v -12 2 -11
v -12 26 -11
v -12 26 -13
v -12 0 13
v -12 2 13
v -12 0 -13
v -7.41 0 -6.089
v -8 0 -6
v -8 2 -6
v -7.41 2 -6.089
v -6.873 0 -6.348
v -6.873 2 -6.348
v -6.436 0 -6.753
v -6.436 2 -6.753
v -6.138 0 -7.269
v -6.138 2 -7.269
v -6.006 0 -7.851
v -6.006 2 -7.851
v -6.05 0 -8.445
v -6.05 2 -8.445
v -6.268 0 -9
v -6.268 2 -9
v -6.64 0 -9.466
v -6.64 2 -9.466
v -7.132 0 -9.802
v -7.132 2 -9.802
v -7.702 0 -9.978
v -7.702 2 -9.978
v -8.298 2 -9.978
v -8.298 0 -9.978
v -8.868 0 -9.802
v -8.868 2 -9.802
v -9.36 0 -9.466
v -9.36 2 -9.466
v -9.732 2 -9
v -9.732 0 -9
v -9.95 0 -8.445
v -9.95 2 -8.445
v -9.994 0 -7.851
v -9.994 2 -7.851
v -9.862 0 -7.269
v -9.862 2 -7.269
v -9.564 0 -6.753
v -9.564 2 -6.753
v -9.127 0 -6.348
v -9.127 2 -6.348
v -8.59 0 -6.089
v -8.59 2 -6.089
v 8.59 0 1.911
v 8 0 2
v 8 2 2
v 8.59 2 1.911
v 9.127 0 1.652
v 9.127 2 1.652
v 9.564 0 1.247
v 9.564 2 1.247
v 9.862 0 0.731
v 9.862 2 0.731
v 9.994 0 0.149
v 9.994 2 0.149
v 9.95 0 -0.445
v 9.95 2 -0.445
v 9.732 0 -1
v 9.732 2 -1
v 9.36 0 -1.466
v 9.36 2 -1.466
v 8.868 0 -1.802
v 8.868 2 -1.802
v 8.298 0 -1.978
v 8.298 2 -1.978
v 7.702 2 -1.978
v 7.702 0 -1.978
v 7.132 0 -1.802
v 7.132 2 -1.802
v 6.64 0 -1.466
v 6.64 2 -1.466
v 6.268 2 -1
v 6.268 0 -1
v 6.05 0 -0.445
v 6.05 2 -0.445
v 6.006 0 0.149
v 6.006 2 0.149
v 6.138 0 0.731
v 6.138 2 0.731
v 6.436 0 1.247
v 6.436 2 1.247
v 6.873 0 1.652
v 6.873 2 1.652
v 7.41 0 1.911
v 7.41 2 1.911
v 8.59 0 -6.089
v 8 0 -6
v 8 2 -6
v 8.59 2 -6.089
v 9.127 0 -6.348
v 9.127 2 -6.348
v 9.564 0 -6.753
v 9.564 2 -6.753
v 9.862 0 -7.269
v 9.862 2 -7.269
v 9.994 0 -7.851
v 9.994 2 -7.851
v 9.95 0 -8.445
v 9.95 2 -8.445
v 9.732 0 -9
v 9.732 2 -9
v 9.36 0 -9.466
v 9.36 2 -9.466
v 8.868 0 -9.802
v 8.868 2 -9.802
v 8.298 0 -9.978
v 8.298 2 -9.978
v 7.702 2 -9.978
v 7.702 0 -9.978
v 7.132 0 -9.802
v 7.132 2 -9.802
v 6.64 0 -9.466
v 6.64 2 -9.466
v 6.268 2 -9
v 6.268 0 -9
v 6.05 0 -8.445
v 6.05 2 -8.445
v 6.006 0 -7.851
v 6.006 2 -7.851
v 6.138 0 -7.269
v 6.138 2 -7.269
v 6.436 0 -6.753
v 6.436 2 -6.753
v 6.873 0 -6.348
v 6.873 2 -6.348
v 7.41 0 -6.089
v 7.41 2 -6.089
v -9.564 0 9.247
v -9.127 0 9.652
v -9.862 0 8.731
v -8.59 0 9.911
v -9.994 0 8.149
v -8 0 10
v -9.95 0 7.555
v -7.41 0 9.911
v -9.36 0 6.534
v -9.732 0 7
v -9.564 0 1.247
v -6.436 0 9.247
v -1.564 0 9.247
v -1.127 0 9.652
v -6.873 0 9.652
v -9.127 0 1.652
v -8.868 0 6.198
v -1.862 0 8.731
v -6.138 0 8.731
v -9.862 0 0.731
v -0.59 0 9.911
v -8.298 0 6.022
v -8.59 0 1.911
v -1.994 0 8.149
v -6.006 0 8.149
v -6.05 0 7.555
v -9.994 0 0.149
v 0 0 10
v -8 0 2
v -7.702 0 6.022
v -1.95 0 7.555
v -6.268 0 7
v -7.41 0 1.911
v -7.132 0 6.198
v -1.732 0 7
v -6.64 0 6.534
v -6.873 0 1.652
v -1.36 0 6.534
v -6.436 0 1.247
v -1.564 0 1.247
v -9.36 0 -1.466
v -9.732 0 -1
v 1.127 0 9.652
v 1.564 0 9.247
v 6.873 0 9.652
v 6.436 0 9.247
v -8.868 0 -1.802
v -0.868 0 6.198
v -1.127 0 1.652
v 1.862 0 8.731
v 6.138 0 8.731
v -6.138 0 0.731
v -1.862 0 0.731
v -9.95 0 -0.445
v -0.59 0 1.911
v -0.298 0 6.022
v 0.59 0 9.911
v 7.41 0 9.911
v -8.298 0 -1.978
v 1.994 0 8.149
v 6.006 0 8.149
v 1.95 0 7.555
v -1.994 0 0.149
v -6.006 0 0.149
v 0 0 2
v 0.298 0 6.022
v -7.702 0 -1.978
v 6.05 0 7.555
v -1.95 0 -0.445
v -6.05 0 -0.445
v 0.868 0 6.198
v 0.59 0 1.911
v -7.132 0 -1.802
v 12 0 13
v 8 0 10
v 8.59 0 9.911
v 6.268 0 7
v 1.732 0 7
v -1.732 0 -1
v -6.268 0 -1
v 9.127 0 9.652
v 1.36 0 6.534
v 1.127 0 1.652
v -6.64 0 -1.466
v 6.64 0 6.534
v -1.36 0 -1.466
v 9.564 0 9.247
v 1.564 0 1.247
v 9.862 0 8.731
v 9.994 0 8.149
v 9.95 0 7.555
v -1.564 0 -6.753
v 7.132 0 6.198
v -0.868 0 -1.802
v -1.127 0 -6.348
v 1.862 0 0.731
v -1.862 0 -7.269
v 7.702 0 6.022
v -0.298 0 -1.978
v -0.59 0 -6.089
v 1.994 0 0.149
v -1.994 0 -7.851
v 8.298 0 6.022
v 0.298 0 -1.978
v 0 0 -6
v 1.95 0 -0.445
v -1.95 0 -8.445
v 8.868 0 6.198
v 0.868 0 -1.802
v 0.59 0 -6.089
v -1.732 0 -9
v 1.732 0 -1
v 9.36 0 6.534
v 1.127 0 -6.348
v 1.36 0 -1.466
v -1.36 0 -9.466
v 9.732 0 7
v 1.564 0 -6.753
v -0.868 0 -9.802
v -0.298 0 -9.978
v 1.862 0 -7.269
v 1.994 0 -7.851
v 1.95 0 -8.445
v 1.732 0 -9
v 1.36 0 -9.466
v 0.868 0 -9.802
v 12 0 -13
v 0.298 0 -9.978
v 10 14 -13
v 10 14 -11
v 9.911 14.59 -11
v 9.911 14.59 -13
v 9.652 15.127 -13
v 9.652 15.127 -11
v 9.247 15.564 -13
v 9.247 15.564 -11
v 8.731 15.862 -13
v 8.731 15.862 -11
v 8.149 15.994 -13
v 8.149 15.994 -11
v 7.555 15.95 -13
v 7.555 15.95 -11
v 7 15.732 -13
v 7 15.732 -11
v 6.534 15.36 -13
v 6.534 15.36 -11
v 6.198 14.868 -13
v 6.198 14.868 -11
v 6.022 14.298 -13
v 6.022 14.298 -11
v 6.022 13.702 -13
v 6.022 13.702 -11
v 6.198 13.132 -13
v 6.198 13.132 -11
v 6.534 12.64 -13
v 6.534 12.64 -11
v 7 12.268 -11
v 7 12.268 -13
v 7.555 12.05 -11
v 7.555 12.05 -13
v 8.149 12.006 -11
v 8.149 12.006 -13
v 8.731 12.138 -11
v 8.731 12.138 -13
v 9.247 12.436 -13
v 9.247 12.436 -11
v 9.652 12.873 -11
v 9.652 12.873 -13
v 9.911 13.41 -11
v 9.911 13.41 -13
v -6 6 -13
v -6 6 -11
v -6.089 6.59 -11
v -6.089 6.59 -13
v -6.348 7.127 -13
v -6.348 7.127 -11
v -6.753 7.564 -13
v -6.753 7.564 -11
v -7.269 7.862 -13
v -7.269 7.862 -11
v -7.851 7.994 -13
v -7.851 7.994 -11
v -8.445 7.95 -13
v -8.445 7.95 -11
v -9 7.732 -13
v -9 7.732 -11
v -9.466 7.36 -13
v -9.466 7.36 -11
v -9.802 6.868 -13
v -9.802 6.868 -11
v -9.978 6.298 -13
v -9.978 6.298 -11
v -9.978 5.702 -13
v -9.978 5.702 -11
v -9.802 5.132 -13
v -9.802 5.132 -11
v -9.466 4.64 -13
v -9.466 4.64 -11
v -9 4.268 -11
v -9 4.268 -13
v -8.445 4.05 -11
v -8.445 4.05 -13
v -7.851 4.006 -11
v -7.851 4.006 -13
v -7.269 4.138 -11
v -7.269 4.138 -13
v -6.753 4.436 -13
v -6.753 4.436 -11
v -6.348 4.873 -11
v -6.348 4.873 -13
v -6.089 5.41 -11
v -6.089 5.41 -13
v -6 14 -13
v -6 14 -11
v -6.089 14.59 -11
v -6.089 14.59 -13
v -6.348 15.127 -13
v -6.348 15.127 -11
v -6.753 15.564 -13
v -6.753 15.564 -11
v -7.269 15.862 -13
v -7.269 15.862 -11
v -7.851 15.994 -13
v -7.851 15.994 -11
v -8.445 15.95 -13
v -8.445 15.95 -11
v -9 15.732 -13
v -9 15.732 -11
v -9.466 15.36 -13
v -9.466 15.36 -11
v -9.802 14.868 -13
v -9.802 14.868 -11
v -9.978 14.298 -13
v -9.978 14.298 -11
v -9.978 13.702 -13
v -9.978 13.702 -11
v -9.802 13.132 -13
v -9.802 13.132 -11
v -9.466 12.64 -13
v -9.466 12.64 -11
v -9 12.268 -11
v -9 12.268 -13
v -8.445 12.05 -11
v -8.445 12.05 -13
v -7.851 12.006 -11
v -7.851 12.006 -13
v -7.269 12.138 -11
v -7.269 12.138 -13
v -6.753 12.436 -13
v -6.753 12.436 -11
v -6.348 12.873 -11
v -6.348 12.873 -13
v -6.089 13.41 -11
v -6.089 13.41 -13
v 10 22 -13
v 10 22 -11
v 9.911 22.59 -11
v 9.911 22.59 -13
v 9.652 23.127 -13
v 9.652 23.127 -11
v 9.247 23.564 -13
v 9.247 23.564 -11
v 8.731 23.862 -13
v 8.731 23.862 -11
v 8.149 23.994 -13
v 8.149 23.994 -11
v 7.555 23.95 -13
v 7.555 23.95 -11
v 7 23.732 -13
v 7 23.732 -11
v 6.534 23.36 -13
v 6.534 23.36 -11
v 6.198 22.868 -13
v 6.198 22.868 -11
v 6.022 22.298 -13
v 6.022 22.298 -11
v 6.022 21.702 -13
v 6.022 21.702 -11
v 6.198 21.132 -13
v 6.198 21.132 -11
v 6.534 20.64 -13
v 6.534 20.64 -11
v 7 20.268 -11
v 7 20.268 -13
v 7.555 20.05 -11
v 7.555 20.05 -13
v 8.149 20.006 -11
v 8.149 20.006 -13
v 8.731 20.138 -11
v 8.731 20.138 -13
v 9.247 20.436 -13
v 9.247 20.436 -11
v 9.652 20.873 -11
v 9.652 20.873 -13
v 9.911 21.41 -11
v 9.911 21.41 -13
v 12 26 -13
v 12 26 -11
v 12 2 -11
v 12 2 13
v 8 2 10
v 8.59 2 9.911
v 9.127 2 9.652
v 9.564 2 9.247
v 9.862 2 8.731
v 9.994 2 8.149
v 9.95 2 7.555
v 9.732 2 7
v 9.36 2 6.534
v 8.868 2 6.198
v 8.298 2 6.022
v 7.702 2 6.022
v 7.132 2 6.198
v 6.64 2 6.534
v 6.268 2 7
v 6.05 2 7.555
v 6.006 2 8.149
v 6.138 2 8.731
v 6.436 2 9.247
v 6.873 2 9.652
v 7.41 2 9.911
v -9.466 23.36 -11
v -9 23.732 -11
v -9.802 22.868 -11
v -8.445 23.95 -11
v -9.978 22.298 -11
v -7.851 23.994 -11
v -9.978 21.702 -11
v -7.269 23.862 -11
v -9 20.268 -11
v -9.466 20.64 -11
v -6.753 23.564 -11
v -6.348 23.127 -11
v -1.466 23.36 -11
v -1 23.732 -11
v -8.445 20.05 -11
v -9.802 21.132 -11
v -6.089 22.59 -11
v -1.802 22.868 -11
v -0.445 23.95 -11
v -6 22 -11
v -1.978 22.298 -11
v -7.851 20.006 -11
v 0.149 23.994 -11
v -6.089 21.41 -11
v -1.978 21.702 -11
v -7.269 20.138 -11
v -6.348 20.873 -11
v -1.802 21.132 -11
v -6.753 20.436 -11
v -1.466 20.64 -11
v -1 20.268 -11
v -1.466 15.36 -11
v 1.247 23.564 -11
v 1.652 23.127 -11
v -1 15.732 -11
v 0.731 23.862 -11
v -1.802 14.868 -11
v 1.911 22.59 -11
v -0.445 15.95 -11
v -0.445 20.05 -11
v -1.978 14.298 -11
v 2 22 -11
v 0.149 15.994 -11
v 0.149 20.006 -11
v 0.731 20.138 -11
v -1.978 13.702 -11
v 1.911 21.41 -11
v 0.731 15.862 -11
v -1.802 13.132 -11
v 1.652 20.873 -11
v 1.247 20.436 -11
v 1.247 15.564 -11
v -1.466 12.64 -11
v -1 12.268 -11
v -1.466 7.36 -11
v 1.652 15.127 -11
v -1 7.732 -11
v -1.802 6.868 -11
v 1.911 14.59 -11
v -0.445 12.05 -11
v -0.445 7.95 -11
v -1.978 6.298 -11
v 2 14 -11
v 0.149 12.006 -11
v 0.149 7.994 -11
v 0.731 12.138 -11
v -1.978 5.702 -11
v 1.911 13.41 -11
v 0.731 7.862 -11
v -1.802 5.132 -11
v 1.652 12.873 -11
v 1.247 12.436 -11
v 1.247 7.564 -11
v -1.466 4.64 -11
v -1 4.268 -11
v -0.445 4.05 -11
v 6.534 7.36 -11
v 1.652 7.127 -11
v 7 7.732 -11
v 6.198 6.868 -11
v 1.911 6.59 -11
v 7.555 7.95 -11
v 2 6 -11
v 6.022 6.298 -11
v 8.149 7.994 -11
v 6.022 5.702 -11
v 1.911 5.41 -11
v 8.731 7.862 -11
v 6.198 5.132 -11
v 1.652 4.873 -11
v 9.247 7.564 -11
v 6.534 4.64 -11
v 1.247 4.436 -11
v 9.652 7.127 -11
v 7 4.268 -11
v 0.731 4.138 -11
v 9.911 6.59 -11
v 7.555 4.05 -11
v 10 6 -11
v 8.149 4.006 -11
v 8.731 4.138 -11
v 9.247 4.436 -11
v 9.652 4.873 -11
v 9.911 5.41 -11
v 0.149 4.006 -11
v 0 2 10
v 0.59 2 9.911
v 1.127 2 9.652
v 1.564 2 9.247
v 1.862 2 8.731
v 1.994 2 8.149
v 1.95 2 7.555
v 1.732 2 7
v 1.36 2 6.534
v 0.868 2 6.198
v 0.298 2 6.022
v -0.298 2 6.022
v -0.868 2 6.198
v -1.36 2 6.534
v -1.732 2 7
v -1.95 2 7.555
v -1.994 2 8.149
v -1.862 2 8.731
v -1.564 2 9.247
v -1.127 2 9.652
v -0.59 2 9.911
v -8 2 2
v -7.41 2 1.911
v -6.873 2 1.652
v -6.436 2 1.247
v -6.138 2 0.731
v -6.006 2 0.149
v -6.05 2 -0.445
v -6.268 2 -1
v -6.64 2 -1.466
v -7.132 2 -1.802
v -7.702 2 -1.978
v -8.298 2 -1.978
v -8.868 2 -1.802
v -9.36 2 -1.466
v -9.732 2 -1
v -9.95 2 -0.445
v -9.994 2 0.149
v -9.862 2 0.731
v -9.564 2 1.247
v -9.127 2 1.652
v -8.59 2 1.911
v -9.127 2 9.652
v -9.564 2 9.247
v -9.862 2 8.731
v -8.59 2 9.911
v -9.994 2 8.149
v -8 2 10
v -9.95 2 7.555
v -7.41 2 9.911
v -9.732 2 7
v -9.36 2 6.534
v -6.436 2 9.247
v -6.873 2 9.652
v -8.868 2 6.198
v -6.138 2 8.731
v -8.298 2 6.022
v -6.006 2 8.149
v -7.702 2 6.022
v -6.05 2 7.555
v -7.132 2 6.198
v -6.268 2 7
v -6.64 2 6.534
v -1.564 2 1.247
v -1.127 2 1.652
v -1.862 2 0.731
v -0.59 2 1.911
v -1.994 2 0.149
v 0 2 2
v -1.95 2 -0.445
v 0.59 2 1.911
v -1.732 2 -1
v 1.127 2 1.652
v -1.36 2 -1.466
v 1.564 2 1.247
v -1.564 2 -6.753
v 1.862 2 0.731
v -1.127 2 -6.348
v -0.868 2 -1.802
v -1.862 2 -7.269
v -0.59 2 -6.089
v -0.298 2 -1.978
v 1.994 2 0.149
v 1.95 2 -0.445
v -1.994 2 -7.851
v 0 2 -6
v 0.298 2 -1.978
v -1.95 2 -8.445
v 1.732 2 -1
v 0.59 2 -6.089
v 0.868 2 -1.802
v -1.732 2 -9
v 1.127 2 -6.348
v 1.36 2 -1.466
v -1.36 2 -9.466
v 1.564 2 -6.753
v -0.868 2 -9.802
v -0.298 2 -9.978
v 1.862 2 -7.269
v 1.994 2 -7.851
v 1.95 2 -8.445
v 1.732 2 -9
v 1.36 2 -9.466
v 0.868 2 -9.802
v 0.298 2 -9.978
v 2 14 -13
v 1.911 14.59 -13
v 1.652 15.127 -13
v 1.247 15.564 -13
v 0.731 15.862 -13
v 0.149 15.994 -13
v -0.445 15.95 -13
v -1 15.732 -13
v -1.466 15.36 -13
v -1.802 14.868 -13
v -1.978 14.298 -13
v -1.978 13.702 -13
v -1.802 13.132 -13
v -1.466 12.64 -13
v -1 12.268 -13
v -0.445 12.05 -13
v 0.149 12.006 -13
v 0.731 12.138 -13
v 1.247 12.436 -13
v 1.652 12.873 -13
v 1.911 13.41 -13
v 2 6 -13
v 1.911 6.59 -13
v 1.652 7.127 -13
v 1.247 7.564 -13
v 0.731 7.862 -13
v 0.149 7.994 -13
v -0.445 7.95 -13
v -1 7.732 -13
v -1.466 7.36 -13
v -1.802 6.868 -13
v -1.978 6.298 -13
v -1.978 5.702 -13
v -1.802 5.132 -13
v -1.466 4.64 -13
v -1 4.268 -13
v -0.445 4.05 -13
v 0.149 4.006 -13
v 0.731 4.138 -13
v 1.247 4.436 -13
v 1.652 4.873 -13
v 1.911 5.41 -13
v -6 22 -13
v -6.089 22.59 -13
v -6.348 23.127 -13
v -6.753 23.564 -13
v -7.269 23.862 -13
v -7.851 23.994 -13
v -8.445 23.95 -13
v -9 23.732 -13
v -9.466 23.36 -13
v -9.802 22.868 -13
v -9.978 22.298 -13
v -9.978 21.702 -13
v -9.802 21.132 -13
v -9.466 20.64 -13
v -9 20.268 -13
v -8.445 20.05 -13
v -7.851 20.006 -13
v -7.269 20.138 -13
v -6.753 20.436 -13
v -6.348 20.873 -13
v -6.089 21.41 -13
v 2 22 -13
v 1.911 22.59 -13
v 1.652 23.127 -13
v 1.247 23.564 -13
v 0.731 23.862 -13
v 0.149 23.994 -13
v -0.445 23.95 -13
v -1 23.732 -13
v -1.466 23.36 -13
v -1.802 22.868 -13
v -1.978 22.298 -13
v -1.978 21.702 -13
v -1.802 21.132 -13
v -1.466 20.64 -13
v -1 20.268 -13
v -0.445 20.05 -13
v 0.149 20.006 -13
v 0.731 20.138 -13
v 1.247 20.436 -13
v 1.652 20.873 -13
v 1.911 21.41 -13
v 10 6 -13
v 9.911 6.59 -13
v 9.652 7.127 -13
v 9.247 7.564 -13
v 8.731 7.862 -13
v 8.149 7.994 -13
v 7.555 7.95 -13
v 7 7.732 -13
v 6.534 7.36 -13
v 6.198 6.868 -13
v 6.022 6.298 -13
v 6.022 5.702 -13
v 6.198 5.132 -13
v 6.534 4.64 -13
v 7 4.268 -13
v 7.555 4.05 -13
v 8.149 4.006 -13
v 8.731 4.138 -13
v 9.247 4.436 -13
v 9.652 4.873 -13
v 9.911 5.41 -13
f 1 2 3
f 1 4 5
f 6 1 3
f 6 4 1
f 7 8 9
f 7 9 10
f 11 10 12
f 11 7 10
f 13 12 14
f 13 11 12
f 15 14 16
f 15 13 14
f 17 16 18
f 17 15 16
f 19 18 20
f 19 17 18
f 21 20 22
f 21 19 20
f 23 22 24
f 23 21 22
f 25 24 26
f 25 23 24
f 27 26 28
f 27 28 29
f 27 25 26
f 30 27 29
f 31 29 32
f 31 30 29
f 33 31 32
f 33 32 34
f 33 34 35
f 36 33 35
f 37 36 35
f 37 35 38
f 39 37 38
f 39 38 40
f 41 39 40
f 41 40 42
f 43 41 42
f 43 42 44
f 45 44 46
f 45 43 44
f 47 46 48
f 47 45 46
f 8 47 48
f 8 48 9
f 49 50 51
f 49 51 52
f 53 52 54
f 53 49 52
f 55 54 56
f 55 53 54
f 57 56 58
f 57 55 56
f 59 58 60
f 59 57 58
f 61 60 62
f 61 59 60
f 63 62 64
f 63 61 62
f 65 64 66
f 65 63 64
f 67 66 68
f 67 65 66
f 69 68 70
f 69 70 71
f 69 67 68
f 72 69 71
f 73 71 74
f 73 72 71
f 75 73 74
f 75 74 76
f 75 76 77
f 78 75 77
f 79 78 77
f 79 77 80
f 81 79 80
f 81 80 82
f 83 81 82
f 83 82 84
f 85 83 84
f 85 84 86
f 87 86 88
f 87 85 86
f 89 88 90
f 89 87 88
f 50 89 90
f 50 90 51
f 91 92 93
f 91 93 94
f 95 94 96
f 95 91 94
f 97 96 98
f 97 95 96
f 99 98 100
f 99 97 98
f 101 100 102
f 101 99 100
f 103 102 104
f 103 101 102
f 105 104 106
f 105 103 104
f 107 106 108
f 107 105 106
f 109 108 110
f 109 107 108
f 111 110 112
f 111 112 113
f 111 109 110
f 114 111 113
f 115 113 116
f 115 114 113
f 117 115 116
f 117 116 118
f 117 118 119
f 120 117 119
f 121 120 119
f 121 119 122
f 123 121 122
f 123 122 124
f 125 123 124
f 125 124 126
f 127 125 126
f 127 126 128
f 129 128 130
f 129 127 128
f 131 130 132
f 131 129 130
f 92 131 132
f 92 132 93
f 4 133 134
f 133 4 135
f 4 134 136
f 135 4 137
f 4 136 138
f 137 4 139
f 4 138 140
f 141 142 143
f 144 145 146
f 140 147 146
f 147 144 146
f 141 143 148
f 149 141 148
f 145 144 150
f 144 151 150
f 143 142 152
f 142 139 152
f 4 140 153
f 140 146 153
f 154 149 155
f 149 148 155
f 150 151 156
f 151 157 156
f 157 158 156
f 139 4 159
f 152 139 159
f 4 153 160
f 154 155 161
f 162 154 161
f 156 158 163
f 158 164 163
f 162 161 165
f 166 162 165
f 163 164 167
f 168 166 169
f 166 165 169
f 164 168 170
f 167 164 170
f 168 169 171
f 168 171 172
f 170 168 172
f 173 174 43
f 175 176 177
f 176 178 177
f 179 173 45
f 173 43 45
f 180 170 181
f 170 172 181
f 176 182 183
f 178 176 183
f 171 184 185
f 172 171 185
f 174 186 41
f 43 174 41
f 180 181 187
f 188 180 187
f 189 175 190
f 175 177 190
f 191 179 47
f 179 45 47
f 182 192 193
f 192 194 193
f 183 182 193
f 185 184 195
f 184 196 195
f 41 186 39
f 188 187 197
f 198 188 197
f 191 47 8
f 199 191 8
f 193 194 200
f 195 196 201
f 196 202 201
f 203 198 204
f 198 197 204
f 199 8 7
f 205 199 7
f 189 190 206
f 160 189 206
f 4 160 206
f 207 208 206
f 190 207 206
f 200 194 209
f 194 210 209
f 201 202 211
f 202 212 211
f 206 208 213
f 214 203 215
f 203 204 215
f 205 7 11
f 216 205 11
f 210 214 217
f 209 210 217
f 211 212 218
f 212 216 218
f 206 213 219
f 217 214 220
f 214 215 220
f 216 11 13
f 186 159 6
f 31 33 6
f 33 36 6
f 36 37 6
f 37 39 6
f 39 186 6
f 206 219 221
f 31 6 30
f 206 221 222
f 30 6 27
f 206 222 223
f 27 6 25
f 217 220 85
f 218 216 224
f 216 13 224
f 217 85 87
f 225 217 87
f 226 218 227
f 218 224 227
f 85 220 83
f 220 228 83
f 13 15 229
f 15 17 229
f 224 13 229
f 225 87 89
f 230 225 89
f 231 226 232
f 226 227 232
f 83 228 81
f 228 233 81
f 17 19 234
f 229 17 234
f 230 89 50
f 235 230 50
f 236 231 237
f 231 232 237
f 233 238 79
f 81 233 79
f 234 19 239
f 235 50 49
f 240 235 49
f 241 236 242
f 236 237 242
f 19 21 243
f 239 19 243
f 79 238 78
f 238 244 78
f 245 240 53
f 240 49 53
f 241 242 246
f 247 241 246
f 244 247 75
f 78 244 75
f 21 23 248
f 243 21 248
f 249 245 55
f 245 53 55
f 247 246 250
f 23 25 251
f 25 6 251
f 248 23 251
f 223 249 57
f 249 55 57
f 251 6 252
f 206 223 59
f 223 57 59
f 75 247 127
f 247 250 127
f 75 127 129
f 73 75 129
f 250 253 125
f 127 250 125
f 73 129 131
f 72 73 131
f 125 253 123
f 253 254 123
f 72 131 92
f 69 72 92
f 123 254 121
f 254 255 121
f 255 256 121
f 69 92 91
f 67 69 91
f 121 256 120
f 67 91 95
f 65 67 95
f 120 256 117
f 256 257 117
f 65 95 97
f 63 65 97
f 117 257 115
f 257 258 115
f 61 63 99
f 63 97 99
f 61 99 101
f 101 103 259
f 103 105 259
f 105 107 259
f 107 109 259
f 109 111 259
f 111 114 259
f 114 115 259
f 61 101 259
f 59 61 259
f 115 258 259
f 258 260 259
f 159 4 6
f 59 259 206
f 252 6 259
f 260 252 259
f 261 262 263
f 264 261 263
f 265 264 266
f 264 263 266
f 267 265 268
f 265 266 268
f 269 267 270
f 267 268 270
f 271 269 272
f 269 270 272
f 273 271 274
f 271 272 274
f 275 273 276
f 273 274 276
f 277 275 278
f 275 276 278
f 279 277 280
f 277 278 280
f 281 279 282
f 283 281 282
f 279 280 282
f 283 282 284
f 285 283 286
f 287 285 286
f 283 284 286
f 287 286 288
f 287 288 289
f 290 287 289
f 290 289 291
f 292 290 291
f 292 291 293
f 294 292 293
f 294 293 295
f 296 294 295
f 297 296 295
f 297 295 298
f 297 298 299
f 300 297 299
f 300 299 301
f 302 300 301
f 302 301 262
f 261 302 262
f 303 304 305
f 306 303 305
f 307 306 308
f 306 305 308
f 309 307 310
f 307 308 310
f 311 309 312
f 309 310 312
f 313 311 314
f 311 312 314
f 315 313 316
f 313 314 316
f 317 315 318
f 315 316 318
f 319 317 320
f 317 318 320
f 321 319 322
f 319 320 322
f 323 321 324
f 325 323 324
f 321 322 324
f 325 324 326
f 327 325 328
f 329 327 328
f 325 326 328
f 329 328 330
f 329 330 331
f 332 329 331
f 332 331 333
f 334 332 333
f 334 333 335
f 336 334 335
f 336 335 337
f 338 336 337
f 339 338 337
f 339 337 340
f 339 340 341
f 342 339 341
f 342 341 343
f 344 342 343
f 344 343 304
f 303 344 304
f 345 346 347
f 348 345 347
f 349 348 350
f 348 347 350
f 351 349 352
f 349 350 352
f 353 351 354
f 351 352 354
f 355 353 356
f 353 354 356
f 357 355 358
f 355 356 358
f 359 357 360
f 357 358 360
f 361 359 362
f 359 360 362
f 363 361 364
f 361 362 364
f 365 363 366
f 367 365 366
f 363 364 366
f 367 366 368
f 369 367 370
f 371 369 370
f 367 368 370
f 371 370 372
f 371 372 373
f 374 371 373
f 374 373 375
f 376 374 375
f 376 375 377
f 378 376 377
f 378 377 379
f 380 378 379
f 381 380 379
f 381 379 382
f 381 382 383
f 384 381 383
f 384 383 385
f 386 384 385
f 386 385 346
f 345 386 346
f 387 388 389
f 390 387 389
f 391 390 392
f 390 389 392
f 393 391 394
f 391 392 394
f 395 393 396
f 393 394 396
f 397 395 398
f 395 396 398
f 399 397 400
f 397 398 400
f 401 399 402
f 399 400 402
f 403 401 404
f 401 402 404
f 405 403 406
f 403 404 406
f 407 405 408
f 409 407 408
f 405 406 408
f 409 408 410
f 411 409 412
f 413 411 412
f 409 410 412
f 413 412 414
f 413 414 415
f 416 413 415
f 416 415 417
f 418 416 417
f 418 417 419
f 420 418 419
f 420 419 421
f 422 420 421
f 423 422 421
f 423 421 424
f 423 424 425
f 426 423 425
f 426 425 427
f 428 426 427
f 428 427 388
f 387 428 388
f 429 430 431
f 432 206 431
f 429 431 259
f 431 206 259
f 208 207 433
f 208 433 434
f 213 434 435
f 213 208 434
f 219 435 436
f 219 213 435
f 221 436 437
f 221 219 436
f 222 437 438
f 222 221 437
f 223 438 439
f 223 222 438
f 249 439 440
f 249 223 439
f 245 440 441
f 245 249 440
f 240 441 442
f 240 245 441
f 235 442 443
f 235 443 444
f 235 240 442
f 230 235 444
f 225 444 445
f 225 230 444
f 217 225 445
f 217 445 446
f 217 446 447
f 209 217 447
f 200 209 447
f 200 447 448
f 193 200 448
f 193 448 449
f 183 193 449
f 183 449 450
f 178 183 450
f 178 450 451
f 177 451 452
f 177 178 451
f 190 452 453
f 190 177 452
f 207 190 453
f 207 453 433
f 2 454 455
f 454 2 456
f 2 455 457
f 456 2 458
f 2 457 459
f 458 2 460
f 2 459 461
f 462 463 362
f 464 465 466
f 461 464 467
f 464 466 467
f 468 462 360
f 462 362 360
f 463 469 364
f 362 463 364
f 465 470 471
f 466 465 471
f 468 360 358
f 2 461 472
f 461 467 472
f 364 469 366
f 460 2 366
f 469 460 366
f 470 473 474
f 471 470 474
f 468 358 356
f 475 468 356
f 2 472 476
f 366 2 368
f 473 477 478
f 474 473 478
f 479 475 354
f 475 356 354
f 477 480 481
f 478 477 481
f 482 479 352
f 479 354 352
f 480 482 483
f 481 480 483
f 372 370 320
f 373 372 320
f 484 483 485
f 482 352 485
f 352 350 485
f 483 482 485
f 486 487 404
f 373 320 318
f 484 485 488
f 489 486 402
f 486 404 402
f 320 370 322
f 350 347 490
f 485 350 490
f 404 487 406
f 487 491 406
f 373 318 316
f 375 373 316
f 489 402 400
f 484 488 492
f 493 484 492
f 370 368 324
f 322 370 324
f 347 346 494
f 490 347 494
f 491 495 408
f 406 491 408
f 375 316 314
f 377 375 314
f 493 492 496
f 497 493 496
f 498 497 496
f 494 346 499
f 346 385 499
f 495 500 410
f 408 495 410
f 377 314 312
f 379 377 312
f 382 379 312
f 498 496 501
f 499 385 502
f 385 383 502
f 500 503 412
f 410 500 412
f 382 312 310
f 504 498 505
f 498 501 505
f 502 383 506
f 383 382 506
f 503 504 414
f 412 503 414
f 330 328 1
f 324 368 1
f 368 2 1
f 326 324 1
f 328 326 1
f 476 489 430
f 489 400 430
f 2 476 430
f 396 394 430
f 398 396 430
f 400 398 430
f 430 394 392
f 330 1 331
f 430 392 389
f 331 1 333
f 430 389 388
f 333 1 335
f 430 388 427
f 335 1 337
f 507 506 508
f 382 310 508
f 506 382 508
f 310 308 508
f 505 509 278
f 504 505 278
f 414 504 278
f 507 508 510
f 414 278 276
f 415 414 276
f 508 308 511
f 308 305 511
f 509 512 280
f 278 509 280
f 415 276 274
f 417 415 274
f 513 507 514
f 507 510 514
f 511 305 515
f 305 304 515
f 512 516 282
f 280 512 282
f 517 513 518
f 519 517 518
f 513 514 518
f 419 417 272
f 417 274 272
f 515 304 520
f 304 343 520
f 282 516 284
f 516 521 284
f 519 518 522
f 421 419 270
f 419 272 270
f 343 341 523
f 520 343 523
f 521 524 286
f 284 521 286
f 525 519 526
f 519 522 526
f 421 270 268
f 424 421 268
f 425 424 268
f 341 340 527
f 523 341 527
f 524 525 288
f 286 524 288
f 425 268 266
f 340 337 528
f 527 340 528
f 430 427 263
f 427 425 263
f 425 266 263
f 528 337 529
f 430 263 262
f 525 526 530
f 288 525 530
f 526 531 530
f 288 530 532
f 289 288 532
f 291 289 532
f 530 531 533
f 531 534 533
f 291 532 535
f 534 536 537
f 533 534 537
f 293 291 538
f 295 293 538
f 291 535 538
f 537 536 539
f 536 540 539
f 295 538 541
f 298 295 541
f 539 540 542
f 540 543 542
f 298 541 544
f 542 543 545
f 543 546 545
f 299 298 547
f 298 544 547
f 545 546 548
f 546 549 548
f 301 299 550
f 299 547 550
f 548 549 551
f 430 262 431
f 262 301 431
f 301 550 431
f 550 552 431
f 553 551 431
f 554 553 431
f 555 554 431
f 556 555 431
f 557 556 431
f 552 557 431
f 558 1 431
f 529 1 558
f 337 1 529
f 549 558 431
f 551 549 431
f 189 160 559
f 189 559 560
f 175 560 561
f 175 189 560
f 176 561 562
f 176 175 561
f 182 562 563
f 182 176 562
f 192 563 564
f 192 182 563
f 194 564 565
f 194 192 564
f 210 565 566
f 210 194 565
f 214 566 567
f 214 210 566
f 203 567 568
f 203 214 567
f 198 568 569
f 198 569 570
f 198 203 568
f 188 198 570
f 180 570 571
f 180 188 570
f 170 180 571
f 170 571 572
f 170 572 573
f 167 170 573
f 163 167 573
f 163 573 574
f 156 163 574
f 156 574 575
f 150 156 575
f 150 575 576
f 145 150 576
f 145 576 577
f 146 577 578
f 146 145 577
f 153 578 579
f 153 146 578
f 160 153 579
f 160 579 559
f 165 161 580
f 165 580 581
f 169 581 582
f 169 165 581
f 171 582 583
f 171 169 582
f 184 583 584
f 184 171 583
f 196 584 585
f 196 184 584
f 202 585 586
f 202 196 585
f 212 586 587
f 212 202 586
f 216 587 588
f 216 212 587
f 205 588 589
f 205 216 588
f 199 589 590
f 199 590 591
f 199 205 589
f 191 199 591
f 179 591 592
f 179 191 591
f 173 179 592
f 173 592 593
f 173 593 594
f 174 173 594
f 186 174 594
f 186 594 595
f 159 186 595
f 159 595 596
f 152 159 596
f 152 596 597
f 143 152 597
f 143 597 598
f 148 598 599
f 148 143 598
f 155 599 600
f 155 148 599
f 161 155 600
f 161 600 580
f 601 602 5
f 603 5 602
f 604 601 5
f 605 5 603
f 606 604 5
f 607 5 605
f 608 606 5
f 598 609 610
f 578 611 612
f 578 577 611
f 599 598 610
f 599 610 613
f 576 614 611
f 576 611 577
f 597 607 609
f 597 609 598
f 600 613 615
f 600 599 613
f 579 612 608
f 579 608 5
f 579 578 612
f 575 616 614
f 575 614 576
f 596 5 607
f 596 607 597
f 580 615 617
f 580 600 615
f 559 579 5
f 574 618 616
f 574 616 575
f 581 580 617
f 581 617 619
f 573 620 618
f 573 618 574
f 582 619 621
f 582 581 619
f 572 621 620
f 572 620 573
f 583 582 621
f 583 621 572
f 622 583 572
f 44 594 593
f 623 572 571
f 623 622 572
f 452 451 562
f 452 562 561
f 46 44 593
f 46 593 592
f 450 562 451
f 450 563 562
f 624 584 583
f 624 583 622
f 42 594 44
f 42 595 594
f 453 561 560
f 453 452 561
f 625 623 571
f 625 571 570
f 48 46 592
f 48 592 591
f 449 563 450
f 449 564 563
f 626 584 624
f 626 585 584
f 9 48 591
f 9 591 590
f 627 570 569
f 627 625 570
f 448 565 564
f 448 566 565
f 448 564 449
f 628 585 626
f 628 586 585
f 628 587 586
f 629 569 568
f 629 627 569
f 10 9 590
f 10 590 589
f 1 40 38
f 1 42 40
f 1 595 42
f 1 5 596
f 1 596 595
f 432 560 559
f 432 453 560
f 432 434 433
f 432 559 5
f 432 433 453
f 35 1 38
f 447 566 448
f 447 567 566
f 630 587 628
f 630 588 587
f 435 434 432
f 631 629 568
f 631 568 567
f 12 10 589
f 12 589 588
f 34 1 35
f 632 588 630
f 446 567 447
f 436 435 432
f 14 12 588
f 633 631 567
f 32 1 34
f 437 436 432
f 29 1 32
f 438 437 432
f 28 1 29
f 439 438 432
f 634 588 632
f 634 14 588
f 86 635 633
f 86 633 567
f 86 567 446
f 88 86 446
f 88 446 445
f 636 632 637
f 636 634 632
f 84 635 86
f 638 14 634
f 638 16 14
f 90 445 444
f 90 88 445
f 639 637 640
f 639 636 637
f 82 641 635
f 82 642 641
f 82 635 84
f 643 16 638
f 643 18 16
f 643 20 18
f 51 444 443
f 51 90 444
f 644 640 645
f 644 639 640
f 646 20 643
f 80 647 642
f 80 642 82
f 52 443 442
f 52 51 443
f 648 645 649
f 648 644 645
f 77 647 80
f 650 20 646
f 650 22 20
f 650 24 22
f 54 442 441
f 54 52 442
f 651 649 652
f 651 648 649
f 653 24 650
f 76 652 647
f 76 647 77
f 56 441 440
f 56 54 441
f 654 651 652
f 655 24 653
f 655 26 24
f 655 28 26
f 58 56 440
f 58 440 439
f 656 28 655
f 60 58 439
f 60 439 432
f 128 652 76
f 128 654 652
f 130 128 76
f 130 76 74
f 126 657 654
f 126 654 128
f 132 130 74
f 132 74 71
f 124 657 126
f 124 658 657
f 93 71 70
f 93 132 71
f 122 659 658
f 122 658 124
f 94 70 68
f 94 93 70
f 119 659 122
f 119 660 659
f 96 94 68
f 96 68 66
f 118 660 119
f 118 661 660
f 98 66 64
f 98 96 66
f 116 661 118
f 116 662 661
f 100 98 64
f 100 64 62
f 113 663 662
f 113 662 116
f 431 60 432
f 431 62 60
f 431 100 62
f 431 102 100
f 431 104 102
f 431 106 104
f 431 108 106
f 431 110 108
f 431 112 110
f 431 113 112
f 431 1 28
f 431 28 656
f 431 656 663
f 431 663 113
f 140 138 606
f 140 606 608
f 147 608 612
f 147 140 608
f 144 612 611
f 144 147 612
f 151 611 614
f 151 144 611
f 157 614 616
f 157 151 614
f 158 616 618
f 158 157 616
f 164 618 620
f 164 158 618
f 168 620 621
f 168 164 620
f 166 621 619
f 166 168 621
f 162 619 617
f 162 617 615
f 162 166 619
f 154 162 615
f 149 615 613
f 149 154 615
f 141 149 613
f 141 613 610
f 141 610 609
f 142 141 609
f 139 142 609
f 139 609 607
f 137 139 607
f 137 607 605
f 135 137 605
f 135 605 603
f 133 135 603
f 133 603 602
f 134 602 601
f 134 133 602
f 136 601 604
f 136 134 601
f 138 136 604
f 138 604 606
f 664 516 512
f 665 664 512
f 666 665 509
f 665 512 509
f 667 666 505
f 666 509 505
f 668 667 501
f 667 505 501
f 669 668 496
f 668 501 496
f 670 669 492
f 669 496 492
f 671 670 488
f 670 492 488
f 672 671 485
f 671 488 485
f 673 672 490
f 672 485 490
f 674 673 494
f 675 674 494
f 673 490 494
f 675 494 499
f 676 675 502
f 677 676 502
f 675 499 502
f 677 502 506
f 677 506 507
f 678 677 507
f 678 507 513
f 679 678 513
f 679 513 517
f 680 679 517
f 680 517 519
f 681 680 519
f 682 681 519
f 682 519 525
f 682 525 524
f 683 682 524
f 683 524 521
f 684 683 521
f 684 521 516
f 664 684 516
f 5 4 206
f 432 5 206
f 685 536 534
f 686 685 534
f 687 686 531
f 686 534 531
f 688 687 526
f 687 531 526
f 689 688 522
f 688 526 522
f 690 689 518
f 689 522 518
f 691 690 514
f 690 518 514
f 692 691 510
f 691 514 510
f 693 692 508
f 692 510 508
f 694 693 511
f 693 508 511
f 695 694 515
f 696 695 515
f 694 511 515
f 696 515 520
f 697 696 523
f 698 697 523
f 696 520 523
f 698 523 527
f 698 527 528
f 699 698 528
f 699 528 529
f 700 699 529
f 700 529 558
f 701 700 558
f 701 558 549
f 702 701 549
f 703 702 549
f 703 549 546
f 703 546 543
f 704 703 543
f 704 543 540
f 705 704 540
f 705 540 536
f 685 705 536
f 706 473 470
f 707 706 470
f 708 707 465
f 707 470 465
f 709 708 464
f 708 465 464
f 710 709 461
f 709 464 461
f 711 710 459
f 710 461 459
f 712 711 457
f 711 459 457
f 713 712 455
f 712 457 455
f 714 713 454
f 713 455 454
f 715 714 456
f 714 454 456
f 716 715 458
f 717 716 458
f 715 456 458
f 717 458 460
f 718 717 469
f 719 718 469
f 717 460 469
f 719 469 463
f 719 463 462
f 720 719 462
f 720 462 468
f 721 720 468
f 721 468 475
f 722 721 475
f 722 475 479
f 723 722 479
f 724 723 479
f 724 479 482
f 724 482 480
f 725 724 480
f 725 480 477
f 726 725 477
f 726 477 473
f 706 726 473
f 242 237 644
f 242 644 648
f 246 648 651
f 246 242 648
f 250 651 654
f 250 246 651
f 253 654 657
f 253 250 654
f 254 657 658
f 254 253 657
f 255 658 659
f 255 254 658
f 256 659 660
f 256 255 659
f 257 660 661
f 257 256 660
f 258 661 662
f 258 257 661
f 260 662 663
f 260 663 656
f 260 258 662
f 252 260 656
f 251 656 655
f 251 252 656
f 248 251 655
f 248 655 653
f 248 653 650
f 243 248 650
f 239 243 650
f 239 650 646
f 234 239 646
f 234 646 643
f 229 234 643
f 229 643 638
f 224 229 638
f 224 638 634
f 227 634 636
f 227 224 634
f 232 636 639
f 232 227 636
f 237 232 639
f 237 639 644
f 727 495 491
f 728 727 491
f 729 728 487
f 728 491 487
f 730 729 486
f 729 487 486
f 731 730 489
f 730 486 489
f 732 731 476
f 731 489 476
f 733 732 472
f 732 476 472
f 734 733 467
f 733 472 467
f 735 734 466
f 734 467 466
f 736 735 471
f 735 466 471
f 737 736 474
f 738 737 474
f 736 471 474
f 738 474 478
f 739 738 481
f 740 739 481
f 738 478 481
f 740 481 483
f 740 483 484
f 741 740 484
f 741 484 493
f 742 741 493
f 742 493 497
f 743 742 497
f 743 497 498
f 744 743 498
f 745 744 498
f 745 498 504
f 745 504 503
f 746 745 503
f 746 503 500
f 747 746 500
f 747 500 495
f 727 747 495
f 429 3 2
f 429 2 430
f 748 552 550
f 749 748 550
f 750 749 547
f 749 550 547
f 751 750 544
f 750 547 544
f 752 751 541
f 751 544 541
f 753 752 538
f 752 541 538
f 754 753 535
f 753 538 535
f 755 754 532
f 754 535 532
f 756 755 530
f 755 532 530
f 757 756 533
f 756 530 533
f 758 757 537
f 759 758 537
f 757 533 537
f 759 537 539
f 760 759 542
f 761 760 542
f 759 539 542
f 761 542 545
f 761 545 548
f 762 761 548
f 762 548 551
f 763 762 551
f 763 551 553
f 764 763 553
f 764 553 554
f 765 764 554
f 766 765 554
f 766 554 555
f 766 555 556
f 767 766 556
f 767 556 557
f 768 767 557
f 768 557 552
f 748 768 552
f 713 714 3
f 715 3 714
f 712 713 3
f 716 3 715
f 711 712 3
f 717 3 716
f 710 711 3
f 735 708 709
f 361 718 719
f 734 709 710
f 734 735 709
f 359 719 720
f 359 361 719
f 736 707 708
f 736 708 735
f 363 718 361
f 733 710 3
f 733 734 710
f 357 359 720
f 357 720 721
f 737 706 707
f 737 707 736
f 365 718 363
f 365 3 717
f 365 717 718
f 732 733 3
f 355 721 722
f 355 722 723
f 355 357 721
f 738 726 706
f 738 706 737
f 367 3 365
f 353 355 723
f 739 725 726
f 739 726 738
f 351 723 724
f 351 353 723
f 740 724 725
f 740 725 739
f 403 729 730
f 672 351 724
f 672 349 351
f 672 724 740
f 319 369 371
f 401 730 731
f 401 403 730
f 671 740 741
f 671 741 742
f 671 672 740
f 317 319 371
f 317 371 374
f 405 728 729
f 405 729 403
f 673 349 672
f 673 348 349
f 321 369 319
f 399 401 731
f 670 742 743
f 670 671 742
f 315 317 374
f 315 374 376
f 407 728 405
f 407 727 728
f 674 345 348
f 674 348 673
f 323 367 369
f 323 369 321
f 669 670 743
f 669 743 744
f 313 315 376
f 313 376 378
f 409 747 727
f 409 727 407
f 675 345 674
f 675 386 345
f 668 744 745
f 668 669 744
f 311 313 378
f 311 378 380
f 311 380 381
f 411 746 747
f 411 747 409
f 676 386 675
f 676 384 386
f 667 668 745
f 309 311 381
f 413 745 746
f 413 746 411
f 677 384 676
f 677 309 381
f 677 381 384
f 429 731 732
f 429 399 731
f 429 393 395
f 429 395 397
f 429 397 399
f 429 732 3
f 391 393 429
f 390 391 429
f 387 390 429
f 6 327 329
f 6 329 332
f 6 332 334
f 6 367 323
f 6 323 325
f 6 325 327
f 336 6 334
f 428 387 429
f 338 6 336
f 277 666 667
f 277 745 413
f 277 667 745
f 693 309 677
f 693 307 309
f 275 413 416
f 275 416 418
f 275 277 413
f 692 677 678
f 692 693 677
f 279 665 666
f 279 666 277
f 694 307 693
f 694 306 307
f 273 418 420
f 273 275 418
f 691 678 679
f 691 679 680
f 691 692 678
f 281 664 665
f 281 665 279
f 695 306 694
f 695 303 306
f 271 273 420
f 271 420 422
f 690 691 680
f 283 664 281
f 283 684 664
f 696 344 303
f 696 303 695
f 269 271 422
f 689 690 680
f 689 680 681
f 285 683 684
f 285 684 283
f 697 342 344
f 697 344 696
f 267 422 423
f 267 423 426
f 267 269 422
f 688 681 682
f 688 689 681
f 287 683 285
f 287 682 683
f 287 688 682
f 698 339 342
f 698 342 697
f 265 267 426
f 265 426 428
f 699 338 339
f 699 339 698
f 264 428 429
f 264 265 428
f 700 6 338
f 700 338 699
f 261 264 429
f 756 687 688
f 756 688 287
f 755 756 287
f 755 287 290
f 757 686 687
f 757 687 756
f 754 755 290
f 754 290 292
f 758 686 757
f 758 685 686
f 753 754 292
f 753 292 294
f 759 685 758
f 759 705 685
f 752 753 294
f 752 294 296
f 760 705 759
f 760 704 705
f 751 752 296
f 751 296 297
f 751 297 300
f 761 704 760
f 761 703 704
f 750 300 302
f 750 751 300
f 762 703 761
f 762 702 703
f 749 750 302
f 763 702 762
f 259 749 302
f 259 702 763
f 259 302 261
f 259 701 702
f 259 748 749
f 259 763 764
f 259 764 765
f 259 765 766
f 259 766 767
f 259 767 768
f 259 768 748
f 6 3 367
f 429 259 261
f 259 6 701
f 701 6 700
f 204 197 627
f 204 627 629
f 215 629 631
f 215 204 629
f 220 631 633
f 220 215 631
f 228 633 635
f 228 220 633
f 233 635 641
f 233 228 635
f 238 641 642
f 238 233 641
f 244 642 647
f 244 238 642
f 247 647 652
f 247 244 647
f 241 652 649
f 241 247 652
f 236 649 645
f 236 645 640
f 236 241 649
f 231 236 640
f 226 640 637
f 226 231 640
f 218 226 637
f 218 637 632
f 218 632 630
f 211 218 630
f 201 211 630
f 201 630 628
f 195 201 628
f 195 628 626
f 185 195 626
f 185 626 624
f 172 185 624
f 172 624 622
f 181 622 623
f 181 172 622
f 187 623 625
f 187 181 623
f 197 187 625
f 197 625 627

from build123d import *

# Parameters (mm, degrees)
SKETCH1_W           = 24
SKETCH1_H           = 24
SKETCH1_R           = 2
BOSS_EXTRUDE1_DEPTH = 2
SKETCH1_3_W         = 24
SKETCH1_3_H         = 2
BOSS_EXTRUDE2_DEPTH = 26
SKETCH2_R           = 2
CUT_EXTRUDE1_DEPTH  = 26


with BuildPart() as part:
    # Sketch1 → Boss-Extrude1 (new body)
    with BuildSketch(Plane(origin=(0, 0, 0), x_dir=(1, 0, 0), z_dir=(0, 1, 0))):
        with Locations((0, -1)):
            Rectangle(SKETCH1_W, SKETCH1_H)
        with Locations((-8, -8)):
            Circle(SKETCH1_R, mode=Mode.SUBTRACT)
        with Locations((-8, 0)):
            Circle(SKETCH1_R, mode=Mode.SUBTRACT)
        with Locations((0, -8)):
            Circle(SKETCH1_R, mode=Mode.SUBTRACT)
        with Locations((8, -8)):
            Circle(SKETCH1_R, mode=Mode.SUBTRACT)
        Circle(SKETCH1_R, mode=Mode.SUBTRACT)
        with Locations((8, 0)):
            Circle(SKETCH1_R, mode=Mode.SUBTRACT)
        with Locations((-8, 8)):
            Circle(SKETCH1_R, mode=Mode.SUBTRACT)
        with Locations((0, 8)):
            Circle(SKETCH1_R, mode=Mode.SUBTRACT)
        with Locations((8, 8)):
            Circle(SKETCH1_R, mode=Mode.SUBTRACT)
    extrude(amount=BOSS_EXTRUDE1_DEPTH)

    # Sketch1<3> → Boss-Extrude2 (add)
    with BuildSketch(Plane(origin=(0, 0, 0), x_dir=(1, 0, 0), z_dir=(0, 1, 0))):
        with Locations((0, 12)):
            Rectangle(SKETCH1_3_W, SKETCH1_3_H)
    extrude(amount=BOSS_EXTRUDE2_DEPTH)

    # Sketch2 → Cut-Extrude1 (cut)
    with BuildSketch(Plane.XY.offset(-11)):
        with Locations((-8, 22)):
            Circle(SKETCH2_R)
        with Locations((0, 22)):
            Circle(SKETCH2_R)
        with Locations((8, 22)):
            Circle(SKETCH2_R)
        with Locations((-8, 14)):
            Circle(SKETCH2_R)
        with Locations((0, 14)):
            Circle(SKETCH2_R)
        with Locations((8, 14)):
            Circle(SKETCH2_R)
        with Locations((8, 6)):
            Circle(SKETCH2_R)
        with Locations((0, 6)):
            Circle(SKETCH2_R)
        with Locations((-8, 6)):
            Circle(SKETCH2_R)
    extrude(amount=-CUT_EXTRUDE1_DEPTH, mode=Mode.SUBTRACT)


solid = part.part
